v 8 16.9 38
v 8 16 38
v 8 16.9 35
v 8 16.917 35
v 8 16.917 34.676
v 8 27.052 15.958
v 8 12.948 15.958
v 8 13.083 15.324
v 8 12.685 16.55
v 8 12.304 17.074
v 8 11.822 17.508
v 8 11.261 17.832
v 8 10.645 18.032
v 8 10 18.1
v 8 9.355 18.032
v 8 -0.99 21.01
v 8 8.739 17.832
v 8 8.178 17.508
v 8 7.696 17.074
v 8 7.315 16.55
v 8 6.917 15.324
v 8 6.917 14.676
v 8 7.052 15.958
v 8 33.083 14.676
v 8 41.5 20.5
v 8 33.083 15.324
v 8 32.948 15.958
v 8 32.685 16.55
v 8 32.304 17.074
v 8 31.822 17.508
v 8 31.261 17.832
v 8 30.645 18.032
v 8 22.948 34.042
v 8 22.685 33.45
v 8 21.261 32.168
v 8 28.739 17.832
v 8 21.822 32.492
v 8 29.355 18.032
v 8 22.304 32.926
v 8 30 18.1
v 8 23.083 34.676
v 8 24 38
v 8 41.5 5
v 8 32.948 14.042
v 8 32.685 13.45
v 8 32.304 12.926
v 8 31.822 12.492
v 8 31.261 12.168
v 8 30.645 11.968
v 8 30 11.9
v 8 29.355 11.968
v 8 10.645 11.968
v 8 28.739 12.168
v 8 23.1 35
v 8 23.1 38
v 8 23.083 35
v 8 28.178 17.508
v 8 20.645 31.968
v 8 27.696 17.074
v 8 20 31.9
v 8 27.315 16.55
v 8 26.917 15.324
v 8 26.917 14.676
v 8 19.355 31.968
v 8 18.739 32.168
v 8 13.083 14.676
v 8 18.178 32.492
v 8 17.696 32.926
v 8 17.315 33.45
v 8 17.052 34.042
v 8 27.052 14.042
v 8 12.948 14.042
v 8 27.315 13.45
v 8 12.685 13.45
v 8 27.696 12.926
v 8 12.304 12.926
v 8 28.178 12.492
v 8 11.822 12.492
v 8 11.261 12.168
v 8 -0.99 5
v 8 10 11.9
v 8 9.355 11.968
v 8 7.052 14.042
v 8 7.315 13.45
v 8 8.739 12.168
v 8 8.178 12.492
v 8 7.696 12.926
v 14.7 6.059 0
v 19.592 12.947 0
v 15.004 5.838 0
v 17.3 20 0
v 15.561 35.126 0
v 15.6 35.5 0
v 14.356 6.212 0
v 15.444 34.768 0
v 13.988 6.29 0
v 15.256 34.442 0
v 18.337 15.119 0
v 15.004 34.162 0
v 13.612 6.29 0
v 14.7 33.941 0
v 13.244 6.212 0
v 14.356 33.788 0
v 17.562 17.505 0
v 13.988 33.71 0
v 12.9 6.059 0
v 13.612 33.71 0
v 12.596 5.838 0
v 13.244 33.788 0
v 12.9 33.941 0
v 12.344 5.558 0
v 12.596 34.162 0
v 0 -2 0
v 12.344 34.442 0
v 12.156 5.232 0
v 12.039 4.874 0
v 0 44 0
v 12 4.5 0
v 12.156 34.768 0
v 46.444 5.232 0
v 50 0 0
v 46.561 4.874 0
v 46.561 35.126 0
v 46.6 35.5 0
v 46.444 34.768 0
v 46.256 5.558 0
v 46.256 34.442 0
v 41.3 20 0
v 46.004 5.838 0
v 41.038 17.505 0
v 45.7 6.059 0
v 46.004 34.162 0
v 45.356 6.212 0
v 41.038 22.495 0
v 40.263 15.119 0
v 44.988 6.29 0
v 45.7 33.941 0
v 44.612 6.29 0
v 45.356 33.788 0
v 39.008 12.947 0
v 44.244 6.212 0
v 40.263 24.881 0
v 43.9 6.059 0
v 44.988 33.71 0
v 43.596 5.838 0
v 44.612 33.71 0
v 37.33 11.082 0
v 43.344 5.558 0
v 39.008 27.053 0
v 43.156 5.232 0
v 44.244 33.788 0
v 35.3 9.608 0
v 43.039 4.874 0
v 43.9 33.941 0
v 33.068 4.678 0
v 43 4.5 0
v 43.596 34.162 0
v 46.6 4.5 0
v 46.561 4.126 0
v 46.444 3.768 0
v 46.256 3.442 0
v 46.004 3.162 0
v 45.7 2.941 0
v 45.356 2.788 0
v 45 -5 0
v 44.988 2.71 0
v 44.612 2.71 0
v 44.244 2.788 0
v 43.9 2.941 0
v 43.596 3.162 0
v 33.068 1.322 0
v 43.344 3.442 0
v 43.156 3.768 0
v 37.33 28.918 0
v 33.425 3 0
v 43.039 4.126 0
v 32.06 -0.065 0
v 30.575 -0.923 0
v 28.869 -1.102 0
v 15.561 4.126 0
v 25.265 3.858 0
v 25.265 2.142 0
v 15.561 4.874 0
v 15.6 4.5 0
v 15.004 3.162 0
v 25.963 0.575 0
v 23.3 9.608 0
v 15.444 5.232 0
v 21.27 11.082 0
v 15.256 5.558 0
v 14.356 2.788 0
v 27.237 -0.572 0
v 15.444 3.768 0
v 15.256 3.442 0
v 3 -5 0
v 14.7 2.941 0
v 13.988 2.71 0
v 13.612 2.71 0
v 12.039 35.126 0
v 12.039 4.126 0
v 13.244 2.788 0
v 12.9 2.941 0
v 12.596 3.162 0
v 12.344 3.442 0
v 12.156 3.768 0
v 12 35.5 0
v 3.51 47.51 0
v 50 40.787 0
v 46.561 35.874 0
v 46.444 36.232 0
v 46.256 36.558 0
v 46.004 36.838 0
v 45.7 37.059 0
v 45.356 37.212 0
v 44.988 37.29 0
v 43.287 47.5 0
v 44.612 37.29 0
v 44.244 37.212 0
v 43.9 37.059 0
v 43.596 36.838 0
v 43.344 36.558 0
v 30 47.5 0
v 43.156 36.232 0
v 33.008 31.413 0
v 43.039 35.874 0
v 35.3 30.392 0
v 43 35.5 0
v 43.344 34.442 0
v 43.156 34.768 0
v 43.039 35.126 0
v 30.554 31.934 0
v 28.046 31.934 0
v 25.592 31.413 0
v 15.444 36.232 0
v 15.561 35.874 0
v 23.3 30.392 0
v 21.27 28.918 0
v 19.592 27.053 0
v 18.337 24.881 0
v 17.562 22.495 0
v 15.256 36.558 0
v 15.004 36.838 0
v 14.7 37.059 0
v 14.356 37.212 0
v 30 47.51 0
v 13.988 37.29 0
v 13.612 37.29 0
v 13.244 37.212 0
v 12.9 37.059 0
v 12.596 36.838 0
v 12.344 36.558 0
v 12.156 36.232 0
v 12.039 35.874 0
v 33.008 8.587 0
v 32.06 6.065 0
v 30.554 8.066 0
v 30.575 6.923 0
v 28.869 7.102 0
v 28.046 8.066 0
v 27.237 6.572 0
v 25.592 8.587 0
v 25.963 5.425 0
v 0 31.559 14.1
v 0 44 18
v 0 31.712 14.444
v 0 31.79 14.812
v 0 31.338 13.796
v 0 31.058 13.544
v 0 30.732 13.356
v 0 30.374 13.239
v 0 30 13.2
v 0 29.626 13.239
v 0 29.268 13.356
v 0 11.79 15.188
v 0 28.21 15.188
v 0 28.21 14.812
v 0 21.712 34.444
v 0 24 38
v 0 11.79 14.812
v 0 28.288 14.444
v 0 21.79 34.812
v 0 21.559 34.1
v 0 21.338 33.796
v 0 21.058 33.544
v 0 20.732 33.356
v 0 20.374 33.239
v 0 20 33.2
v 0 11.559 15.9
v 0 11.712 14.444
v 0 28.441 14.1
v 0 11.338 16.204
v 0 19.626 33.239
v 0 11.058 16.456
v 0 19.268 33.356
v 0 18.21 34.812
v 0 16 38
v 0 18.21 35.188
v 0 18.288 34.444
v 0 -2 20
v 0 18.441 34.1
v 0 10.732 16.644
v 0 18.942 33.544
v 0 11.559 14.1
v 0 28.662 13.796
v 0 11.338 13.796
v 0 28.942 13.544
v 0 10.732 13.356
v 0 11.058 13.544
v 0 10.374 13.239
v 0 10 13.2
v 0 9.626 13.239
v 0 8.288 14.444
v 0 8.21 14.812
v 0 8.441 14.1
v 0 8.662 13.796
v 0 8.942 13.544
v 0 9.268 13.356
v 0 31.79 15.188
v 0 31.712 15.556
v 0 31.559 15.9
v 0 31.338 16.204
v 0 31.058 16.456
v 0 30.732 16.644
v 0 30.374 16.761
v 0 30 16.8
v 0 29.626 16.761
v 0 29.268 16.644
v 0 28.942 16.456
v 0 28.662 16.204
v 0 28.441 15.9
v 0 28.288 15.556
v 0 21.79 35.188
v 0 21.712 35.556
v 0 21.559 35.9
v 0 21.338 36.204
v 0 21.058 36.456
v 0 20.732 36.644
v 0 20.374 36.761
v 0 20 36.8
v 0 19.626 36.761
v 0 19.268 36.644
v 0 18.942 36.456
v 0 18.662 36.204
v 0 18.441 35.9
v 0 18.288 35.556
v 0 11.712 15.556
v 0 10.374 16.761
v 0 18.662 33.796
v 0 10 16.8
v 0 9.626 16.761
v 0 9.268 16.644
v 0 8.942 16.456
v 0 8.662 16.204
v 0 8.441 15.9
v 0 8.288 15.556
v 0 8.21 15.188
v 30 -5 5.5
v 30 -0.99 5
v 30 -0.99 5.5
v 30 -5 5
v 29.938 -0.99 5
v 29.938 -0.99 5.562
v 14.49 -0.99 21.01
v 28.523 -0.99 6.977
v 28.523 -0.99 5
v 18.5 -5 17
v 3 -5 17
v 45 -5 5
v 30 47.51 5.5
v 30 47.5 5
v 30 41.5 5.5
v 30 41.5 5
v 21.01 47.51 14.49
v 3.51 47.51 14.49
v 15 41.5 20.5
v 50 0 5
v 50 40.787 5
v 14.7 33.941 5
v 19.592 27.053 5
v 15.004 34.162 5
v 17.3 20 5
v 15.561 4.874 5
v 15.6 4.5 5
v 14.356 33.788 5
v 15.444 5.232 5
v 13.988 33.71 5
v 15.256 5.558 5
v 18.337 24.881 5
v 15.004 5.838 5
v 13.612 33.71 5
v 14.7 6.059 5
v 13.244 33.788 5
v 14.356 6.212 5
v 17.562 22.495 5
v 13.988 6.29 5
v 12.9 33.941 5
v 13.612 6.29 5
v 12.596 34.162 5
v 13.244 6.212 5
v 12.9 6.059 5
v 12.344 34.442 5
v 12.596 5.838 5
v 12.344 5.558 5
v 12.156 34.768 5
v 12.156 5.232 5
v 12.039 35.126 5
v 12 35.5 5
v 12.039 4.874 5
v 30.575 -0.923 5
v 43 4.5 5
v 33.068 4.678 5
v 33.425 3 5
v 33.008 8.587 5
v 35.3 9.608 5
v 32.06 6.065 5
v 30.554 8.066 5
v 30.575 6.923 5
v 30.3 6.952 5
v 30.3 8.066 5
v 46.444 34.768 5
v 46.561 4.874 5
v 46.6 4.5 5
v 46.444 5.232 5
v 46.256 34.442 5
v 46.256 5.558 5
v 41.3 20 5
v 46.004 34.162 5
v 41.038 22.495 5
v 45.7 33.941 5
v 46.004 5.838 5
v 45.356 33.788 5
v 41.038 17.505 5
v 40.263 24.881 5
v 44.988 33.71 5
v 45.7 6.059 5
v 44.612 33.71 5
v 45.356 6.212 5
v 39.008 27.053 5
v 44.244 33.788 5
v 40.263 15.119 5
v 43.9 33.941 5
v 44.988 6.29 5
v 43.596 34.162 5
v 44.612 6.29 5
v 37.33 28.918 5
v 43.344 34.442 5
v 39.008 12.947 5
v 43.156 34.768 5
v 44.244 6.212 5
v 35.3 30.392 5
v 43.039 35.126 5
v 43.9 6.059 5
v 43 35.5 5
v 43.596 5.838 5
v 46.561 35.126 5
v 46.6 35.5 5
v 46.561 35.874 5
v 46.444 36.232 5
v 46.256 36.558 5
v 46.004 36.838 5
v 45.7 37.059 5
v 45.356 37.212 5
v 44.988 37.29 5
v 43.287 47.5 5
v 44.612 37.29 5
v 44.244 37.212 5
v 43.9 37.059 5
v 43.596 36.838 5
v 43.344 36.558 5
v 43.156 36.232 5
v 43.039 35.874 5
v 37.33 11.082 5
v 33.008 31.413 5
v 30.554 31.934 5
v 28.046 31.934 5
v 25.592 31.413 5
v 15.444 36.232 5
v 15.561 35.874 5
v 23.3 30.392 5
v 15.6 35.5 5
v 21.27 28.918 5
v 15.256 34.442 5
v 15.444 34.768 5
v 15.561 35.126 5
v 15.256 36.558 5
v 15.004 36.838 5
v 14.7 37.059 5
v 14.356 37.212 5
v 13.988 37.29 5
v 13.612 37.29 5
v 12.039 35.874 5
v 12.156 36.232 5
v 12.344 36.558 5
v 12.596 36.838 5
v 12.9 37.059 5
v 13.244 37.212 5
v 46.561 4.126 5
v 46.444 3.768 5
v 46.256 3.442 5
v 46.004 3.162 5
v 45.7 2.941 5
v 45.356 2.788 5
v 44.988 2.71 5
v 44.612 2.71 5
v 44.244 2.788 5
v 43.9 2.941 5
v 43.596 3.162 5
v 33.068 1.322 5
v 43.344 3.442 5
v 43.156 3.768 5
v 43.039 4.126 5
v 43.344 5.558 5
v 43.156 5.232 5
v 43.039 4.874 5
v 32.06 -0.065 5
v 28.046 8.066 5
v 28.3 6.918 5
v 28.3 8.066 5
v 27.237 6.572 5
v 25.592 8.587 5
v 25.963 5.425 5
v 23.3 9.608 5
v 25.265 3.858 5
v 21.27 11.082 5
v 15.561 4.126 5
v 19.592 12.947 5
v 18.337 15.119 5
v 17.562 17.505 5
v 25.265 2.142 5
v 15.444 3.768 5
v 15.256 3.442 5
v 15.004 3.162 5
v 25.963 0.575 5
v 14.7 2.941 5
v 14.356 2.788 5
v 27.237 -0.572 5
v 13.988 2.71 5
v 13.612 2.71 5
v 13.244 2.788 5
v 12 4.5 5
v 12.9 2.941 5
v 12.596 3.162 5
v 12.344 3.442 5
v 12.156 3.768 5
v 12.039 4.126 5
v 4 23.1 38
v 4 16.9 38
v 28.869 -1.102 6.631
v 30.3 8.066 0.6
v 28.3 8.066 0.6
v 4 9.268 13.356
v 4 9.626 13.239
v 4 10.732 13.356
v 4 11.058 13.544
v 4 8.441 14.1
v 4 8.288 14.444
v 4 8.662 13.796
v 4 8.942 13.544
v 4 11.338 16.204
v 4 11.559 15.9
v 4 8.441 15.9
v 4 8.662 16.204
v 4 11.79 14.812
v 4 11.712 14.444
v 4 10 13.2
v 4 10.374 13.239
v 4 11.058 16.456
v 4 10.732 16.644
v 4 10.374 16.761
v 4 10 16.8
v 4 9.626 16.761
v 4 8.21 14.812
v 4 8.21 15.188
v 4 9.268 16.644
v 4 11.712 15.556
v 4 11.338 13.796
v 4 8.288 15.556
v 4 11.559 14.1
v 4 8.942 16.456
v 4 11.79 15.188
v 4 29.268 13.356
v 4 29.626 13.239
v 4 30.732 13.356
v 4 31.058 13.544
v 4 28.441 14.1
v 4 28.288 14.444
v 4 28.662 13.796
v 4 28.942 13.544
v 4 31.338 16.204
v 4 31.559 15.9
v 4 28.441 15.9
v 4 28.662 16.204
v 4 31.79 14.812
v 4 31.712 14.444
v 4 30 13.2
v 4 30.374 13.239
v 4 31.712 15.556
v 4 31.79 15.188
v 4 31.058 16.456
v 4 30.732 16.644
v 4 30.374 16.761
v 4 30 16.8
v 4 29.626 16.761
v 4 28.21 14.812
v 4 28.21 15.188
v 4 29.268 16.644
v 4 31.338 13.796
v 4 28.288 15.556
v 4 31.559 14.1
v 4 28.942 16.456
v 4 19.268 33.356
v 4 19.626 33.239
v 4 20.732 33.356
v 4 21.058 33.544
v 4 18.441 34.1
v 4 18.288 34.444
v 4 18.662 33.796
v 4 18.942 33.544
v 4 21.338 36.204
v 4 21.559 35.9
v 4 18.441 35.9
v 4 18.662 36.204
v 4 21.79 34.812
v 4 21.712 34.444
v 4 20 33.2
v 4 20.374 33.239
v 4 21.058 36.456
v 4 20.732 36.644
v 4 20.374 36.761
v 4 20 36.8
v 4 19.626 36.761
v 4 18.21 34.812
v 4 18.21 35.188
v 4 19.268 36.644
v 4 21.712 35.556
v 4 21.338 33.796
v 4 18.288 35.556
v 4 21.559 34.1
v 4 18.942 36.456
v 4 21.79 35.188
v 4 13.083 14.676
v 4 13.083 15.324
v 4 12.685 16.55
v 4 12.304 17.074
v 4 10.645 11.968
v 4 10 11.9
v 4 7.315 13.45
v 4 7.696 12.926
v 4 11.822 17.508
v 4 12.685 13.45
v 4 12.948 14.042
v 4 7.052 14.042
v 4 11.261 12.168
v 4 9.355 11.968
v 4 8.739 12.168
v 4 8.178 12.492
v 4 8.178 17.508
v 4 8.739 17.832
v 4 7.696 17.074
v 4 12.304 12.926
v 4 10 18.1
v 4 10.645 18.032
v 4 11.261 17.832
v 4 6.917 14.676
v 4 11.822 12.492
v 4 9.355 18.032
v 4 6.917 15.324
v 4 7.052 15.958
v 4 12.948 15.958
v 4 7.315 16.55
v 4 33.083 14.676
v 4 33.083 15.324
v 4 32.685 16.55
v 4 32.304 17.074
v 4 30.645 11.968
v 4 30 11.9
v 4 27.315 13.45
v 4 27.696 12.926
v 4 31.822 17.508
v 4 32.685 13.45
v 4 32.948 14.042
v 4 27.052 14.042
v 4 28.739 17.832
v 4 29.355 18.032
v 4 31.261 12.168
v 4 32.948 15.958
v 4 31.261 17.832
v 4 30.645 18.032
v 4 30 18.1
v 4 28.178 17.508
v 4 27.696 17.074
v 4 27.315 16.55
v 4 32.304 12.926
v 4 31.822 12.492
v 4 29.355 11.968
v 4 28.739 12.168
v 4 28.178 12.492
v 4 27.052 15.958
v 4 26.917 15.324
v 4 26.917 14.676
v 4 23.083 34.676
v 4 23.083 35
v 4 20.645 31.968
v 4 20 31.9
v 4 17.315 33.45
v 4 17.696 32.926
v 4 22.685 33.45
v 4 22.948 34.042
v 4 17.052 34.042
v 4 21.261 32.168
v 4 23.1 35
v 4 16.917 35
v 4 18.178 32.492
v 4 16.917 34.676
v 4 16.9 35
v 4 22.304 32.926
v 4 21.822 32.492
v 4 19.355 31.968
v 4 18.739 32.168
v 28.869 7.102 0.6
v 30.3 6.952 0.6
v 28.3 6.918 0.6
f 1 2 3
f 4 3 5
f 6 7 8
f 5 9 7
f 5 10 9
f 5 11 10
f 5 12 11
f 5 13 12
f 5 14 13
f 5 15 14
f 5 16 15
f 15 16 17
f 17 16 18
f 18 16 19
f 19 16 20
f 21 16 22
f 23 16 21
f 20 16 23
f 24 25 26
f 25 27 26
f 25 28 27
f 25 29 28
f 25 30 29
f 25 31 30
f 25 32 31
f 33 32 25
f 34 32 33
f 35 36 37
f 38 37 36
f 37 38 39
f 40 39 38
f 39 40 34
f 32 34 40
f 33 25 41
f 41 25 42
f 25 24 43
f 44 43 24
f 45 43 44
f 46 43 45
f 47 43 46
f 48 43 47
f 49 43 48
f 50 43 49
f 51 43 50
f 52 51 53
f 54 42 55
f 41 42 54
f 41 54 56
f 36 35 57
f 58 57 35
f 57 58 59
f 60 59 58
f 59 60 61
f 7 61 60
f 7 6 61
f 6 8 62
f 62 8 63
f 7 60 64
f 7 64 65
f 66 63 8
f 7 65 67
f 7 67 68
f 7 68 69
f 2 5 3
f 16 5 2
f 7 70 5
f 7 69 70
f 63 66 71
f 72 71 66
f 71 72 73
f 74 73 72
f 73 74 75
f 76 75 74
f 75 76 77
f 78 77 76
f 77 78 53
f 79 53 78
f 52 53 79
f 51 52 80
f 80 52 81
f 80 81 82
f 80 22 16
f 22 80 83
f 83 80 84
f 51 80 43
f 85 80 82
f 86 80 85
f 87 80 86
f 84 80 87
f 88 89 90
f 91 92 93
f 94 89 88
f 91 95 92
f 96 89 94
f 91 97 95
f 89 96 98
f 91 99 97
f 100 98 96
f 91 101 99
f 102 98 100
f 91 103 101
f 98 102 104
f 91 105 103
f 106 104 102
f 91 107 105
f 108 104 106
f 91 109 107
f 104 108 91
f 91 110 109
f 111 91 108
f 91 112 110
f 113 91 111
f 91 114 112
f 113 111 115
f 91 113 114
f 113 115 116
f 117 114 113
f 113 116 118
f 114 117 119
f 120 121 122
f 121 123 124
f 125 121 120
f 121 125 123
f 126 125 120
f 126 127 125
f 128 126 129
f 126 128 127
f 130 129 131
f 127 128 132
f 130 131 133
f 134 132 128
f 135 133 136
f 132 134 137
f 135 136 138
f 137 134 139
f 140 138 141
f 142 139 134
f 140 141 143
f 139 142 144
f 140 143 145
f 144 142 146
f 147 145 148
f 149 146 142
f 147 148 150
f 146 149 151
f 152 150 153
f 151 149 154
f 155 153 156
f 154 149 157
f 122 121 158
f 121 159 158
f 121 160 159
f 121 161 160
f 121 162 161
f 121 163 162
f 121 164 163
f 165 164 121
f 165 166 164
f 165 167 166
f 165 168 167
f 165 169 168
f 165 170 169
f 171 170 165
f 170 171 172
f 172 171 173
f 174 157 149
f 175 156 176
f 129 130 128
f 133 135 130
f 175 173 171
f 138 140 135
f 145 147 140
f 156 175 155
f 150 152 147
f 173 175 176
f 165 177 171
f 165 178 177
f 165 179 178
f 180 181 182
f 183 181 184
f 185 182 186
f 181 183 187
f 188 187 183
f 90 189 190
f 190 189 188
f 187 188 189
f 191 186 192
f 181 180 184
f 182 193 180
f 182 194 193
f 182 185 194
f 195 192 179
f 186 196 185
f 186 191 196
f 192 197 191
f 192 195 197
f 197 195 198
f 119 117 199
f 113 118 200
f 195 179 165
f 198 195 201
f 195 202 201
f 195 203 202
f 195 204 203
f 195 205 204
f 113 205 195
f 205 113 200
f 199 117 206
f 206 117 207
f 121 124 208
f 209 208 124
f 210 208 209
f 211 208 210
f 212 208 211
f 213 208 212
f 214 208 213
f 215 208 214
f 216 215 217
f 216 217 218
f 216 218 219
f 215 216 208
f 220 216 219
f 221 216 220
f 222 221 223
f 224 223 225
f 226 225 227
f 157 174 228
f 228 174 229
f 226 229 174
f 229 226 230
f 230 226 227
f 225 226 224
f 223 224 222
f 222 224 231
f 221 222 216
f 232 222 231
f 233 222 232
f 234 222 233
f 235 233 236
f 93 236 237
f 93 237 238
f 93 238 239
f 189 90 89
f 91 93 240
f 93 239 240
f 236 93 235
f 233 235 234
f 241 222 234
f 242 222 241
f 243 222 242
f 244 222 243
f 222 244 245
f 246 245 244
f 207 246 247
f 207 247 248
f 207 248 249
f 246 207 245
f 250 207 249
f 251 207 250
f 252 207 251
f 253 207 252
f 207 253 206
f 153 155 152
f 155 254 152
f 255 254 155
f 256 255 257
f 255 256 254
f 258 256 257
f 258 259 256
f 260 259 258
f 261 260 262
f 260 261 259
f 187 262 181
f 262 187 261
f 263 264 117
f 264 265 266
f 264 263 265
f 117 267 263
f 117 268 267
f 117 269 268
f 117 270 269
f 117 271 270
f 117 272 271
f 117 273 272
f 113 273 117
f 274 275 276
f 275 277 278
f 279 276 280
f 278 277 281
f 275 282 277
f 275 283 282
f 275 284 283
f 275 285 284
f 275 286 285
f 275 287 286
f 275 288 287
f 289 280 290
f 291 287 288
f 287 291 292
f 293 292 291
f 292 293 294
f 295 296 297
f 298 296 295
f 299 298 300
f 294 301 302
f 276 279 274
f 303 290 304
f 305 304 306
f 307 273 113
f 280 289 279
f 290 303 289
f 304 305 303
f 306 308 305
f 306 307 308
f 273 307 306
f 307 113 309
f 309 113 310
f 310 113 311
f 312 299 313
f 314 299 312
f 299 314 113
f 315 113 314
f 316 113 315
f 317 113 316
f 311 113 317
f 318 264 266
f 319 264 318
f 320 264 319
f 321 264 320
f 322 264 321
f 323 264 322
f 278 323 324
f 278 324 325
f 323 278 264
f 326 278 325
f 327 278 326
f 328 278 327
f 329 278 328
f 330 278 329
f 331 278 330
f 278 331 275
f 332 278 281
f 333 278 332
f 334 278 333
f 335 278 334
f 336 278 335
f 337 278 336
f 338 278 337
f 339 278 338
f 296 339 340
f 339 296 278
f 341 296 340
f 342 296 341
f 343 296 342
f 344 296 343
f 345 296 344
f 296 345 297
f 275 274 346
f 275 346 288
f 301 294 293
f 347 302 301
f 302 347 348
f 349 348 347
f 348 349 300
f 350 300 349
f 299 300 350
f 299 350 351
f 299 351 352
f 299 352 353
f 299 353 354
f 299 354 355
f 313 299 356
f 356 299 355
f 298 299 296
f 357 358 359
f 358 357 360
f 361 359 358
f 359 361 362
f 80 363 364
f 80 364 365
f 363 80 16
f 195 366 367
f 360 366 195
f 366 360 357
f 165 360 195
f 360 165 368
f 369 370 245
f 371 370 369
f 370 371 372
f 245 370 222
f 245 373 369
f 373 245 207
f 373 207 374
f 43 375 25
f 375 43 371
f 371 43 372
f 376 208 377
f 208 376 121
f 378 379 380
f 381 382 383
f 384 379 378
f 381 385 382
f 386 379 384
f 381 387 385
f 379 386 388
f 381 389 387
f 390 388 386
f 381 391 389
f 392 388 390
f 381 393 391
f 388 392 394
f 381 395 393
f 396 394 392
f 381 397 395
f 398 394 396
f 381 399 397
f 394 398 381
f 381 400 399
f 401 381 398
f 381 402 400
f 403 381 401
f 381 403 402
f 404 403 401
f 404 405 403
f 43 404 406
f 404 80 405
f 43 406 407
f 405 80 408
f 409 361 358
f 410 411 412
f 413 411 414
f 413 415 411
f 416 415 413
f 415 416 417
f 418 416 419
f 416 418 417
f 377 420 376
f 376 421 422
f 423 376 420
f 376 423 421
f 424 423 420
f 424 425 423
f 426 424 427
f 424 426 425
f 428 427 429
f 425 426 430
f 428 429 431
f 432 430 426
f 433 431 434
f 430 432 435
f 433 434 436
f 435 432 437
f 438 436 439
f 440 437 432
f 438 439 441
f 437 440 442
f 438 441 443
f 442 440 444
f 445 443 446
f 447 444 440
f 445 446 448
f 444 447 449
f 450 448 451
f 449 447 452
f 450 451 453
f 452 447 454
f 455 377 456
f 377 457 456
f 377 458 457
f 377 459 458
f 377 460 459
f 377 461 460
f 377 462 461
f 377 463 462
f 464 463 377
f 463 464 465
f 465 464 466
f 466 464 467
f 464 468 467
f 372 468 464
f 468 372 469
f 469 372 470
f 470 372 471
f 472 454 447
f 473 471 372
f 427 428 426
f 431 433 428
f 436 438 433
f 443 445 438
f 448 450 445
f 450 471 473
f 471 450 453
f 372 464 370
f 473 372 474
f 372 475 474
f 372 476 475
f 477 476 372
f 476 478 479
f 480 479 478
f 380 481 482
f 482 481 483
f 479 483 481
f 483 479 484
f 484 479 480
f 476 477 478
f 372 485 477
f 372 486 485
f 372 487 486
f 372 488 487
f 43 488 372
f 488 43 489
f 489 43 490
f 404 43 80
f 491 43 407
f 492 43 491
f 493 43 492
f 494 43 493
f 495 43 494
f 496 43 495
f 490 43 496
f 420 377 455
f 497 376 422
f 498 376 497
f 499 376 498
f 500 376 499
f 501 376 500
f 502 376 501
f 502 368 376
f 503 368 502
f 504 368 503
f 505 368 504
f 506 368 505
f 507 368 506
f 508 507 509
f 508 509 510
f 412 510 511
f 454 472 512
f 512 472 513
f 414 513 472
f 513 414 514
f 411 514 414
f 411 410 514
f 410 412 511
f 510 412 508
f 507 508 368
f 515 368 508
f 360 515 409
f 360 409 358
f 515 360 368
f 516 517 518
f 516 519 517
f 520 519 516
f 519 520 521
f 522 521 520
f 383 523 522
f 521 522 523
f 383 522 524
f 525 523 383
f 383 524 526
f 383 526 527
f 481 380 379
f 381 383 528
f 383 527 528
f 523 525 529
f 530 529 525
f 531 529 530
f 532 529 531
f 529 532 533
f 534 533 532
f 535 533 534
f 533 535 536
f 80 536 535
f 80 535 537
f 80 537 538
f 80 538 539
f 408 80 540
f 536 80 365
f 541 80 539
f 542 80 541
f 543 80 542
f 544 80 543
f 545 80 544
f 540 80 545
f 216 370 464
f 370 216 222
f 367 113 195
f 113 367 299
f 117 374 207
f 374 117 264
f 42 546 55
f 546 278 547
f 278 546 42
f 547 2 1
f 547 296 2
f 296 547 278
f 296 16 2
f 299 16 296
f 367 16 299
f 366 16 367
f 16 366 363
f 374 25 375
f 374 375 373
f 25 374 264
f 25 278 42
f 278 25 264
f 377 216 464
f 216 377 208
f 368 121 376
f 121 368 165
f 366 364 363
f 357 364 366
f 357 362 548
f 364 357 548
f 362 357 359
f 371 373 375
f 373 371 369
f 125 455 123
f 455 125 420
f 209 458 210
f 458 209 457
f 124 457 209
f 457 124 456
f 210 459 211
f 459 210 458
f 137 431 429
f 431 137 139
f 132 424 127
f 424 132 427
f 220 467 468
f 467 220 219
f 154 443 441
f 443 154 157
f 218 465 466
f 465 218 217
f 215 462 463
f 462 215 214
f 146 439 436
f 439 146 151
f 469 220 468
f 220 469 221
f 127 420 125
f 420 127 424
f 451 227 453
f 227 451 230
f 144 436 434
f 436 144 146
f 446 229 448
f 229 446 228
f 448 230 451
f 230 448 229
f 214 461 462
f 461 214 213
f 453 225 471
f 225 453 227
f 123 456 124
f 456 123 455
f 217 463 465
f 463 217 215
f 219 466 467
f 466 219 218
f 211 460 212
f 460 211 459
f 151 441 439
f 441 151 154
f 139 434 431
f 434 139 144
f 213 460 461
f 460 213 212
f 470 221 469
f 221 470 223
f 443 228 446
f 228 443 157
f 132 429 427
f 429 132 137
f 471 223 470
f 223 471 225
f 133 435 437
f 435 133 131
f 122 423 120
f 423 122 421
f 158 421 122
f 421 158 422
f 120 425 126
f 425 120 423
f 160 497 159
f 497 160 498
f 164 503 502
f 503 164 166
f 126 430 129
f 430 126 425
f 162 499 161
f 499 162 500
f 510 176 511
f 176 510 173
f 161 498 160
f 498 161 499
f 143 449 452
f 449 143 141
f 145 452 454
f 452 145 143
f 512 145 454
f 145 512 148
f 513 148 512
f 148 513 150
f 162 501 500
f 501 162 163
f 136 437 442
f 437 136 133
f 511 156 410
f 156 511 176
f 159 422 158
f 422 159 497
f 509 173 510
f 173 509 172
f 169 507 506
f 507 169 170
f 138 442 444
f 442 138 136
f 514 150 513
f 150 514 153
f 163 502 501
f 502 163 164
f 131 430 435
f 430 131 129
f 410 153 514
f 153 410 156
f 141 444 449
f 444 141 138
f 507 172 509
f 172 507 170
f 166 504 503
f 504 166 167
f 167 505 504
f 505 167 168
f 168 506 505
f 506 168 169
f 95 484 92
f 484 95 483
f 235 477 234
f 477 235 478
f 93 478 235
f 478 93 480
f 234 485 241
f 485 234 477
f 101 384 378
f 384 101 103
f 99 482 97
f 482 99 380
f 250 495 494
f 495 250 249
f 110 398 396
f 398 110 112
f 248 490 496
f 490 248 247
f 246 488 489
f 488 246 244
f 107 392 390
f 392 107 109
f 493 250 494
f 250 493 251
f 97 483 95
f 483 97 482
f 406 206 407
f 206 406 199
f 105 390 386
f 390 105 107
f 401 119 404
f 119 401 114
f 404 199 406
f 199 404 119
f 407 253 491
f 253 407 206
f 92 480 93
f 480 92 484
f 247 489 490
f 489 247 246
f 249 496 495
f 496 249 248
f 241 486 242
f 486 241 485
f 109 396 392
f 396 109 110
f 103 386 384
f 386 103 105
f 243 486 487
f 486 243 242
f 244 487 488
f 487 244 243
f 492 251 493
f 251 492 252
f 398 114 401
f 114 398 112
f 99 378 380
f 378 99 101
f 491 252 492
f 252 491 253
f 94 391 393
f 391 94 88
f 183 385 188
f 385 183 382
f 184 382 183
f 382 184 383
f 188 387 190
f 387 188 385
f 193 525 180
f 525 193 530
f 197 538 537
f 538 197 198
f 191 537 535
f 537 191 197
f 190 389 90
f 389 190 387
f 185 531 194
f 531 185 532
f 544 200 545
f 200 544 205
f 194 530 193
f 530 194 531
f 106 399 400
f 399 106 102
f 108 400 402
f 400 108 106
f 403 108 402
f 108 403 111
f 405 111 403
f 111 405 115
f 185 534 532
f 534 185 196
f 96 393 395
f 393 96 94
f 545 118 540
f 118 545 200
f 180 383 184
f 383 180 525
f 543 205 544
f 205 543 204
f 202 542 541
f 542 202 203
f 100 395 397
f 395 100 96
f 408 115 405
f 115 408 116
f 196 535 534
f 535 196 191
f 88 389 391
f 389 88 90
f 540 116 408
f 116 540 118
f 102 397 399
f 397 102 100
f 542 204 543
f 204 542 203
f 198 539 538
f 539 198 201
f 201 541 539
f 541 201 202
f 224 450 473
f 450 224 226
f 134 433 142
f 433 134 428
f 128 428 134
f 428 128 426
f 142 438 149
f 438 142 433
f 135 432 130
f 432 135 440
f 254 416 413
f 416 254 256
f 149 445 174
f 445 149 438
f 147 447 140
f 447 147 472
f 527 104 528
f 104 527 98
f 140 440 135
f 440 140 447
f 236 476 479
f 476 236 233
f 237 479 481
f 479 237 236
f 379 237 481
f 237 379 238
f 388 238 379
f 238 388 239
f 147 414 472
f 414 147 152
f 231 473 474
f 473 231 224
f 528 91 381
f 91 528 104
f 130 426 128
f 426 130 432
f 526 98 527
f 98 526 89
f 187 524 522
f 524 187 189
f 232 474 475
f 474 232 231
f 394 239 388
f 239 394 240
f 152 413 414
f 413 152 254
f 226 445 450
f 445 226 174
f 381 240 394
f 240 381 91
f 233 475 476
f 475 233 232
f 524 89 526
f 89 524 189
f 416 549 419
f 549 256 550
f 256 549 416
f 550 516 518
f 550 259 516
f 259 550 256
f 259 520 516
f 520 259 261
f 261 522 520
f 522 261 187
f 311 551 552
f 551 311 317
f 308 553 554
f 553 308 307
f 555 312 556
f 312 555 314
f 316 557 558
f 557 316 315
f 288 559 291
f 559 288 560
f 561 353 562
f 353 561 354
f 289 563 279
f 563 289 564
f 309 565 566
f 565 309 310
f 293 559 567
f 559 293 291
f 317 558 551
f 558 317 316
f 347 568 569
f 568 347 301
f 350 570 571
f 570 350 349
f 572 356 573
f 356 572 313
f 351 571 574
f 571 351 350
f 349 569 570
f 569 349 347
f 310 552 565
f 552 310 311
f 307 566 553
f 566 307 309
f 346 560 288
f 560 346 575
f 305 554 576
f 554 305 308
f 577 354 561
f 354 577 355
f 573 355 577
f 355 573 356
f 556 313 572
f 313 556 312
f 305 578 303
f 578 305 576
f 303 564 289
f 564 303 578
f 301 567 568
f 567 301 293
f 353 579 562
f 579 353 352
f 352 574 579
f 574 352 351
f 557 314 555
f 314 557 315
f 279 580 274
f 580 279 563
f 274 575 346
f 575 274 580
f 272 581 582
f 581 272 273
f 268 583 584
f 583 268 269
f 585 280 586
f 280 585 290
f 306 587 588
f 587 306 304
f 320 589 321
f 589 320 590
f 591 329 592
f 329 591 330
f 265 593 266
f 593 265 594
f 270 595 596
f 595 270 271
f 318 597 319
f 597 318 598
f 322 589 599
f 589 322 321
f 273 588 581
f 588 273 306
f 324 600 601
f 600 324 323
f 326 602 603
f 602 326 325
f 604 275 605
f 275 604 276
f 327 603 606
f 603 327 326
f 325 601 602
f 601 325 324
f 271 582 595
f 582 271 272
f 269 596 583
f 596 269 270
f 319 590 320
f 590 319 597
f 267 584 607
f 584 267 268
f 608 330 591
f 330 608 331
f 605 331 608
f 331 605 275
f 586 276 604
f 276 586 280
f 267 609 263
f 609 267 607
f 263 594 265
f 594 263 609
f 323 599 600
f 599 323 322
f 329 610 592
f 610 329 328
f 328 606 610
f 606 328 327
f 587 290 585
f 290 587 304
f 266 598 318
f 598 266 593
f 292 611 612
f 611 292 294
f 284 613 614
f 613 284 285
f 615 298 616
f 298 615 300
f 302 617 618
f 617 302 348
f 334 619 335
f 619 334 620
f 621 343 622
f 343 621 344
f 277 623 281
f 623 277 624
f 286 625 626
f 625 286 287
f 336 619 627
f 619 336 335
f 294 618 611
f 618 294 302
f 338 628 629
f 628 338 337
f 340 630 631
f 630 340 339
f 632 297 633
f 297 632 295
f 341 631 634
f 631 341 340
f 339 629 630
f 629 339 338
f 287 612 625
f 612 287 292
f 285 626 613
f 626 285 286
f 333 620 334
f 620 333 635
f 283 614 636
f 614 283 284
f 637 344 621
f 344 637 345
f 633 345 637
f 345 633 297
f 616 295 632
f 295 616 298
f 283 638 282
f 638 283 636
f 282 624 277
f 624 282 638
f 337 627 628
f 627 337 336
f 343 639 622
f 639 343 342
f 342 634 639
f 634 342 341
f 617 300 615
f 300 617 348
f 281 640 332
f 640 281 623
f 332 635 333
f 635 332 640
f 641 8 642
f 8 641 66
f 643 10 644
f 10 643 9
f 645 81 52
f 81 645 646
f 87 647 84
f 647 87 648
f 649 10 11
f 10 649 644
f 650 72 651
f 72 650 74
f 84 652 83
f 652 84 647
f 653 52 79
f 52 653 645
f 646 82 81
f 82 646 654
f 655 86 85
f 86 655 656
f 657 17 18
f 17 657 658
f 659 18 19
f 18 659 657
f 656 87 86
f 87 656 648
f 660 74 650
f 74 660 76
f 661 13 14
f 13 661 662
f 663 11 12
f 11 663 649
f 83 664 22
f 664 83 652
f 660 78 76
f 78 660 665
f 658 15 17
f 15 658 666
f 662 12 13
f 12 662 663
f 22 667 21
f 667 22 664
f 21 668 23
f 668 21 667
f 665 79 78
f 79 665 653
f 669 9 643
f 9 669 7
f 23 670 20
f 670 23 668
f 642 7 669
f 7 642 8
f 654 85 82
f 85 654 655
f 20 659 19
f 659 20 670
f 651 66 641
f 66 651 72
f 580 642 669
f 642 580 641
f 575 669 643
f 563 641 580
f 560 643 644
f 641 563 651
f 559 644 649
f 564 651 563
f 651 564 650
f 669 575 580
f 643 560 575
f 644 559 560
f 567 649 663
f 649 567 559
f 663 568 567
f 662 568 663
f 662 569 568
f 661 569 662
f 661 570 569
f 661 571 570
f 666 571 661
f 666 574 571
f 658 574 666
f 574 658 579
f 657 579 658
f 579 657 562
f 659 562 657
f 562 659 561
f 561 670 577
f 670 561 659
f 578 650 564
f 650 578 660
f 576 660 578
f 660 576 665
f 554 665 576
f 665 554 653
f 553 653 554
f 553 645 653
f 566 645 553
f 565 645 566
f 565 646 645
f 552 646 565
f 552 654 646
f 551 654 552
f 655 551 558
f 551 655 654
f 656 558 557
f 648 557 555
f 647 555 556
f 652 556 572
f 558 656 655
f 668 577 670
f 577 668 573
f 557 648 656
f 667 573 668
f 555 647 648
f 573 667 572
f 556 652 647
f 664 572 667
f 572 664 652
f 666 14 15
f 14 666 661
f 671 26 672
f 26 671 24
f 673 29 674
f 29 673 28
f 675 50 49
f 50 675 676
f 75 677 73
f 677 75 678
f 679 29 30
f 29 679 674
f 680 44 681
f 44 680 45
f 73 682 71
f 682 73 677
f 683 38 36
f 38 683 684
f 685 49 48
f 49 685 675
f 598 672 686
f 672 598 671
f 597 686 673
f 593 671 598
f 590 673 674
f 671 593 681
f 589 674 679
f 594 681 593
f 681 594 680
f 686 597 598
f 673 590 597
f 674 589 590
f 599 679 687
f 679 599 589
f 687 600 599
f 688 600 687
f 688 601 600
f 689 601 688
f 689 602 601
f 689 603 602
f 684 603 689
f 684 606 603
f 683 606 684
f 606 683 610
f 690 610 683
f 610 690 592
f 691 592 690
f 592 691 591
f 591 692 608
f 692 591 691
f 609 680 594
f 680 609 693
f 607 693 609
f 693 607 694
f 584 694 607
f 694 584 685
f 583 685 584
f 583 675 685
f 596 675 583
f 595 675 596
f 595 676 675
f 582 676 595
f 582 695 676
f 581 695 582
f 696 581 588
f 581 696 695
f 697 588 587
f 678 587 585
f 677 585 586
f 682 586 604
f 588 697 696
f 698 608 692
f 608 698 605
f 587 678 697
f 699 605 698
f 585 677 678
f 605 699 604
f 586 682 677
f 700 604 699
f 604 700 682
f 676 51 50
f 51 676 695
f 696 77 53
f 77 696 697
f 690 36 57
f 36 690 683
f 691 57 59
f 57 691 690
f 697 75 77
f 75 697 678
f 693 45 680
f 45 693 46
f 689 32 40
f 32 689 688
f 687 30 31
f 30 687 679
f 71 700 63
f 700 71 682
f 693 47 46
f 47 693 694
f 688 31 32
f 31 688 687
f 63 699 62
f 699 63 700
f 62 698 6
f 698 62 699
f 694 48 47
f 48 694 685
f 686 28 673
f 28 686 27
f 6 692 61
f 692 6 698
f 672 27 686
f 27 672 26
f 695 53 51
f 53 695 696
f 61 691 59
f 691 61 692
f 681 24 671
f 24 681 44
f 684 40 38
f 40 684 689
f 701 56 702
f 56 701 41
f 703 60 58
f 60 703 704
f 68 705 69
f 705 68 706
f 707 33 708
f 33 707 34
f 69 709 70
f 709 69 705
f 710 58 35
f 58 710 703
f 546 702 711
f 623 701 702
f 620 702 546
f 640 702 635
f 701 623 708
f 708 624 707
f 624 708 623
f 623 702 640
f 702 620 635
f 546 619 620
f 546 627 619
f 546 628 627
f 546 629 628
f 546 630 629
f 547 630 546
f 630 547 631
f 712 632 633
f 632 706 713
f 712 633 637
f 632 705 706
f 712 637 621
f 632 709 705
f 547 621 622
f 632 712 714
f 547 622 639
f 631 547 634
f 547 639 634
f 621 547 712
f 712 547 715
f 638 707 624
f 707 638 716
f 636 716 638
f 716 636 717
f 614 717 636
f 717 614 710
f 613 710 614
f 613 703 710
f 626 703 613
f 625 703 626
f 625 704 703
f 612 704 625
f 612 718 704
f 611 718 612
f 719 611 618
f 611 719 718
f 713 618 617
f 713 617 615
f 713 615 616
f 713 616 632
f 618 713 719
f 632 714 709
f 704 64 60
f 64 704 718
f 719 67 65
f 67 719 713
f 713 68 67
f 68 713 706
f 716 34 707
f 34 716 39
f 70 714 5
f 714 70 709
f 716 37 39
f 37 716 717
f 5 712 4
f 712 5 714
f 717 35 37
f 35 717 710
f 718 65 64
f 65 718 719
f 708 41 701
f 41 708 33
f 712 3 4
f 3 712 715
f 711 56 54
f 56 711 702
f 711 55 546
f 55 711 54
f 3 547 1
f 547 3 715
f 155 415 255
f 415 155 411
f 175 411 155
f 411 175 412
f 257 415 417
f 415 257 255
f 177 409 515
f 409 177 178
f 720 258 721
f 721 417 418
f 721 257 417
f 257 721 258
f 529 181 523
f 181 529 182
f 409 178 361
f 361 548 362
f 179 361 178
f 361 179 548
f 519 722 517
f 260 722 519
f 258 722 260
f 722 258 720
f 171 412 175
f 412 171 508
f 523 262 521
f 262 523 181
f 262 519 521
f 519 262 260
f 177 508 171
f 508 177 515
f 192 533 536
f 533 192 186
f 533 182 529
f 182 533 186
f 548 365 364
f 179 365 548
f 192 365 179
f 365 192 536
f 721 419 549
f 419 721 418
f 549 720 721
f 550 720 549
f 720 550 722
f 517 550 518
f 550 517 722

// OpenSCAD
// PRUSA iteration3
// Z axis bottom holder
// GNU GPL v3
// Josef Průša <iam@josefprusa.cz> and contributors
// http://www.reprap.org/wiki/Prusa_Mendel
// http://prusamendel.org

module z_bottom_base(){
 translate([0,-1.5,0]) cube([8,49,16+25]); // plate touching the base
 translate([0,-5,0]) cube([30,4.01,22]); // plate touching the base
 translate([0,41.5,0]) cube([30,6.01,22]); // plate touching the base
 translate([0,-5,0]) cube([50,52.5,5]); // plate touching the base
}

module z_bottom_fancy(){
 // corner cutouts
 translate([0.5,-2.5,0]) rotate([0,0,-45-180]) translate([-15,0,-1]) cube([30,30,51]);
 translate([0.5,40-0.5+5,0]) rotate([0,0,-45+90]) translate([-15,0,-1]) cube([30,30,51]);
 //translate([-4,40+5,5]) rotate([0,0,-35-0]) translate([0,0,0.1]) cube([30,30,51]);
 //translate([-4+11,40+5+5,0]) rotate([0,0,-45-0]) translate([0,0,-1]) cube([30,30,51]);
 translate([8,0,12+20+6]) rotate([0,-90,0]) translate([0,-5,0]) cube([30,50,30]);
 translate([20,-2,12+8]) rotate([45,0,0]) rotate([0,-90,0]) translate([0,-5,0]) cube([30,50,30]);
 translate([25,20,12+30]) rotate([-45,0,0]) rotate([0,-90,0]) translate([0,-5,0]) cube([30,50,30]);
 translate([50-2.5,-5+2.5+67,0]) rotate([0,0,-45-90]) translate([-15,0,-1]) cube([30,30,51]);
 translate([50-2.5,-5+2.5,0]) rotate([0,0,-45-90]) translate([-15,0,-1]) cube([30,30,51]);
 //translate([50-1.5,10-1.5,0]) rotate([0,0,-45]) translate([-15,0,-1]) cube([30,30,51]);
 //translate([0,0,5]) rotate([45+180,0,0]) rotate([0,0,-45+90]) translate([0,0,-15]) cube([30,30,30]);
 // Stiffner cut out
   translate([30,0,5.5]) rotate([0,-45,0]) translate([0,-5,0]) cube([30,60,30]);
}

module z_bottom_holes(){
 // Frame mounting screw holes
 translate([-1,10,10+5]) rotate([0,90,0]) cylinder(h = 20, r=1.8, $fn=30);
 translate([-1,10+20,10+5]) rotate([0,90,0]) cylinder(h = 20, r=1.8, $fn=30);
 translate([-1,10+10,10+20+5]) rotate([0,90,0]) cylinder(h = 20, r=1.8, $fn=30);

 // Frame mounting screw head holes
 translate([4,10,10+5]) rotate([0,90,0]) cylinder(h = 20, r=3.1, $fn=30);
 translate([4,10+20,10+5]) rotate([0,90,0]) cylinder(h = 20, r=3.1, $fn=30);
 translate([4,10+10,10+20+5]) rotate([0,90,0]) cylinder(h = 20, r=3.1, $fn=30);
 translate([4,10+10-3.1,10+20+5]) cube([10,6.2,10]);

 // Z rod holder
 translate([25+4.3,3,-1]) rotate([0,0,0]) cylinder(h = 50, r=4.125, $fn=15);
 translate([25+4.3-1,3,0.6]) cube([2,10,7]); // it's bit up because it helps with printing

 // motor mounting
 translate([25+4.3,20,-1]){
 //translate([15.5,15.5,-1]) cylinder(h = 20, r=1.8, $fn=30);
 
 translate([15.5,15.5,-1]) cylinder(h = 20, r=1.8, $fn=30);
 translate([15.5,-15.5,-1]) cylinder(h = 20, r=1.8, $fn=30);
 translate([-15.5,15.5,-1]) cylinder(h = 20, r=1.8, $fn=30);
 translate([-15.5,-15.5,-1]) cylinder(h = 20, r=1.8, $fn=30);
 
 
 translate([0,0,-1]) cylinder(h = 20, r=12, $fn=30);
 }

}

module z_bottom_right(){
    difference(){
        z_bottom_base();
        z_bottom_fancy();
        z_bottom_holes();
    }
}

module z_bottom_left(){
 translate([0,-23,0]) mirror([0,1,0]) 
    difference(){
        z_bottom_base();
        z_bottom_fancy();
        z_bottom_holes();
 }
}

//z_bottom_holder();
#z_bottom_right();
//#z_bottom_left();
